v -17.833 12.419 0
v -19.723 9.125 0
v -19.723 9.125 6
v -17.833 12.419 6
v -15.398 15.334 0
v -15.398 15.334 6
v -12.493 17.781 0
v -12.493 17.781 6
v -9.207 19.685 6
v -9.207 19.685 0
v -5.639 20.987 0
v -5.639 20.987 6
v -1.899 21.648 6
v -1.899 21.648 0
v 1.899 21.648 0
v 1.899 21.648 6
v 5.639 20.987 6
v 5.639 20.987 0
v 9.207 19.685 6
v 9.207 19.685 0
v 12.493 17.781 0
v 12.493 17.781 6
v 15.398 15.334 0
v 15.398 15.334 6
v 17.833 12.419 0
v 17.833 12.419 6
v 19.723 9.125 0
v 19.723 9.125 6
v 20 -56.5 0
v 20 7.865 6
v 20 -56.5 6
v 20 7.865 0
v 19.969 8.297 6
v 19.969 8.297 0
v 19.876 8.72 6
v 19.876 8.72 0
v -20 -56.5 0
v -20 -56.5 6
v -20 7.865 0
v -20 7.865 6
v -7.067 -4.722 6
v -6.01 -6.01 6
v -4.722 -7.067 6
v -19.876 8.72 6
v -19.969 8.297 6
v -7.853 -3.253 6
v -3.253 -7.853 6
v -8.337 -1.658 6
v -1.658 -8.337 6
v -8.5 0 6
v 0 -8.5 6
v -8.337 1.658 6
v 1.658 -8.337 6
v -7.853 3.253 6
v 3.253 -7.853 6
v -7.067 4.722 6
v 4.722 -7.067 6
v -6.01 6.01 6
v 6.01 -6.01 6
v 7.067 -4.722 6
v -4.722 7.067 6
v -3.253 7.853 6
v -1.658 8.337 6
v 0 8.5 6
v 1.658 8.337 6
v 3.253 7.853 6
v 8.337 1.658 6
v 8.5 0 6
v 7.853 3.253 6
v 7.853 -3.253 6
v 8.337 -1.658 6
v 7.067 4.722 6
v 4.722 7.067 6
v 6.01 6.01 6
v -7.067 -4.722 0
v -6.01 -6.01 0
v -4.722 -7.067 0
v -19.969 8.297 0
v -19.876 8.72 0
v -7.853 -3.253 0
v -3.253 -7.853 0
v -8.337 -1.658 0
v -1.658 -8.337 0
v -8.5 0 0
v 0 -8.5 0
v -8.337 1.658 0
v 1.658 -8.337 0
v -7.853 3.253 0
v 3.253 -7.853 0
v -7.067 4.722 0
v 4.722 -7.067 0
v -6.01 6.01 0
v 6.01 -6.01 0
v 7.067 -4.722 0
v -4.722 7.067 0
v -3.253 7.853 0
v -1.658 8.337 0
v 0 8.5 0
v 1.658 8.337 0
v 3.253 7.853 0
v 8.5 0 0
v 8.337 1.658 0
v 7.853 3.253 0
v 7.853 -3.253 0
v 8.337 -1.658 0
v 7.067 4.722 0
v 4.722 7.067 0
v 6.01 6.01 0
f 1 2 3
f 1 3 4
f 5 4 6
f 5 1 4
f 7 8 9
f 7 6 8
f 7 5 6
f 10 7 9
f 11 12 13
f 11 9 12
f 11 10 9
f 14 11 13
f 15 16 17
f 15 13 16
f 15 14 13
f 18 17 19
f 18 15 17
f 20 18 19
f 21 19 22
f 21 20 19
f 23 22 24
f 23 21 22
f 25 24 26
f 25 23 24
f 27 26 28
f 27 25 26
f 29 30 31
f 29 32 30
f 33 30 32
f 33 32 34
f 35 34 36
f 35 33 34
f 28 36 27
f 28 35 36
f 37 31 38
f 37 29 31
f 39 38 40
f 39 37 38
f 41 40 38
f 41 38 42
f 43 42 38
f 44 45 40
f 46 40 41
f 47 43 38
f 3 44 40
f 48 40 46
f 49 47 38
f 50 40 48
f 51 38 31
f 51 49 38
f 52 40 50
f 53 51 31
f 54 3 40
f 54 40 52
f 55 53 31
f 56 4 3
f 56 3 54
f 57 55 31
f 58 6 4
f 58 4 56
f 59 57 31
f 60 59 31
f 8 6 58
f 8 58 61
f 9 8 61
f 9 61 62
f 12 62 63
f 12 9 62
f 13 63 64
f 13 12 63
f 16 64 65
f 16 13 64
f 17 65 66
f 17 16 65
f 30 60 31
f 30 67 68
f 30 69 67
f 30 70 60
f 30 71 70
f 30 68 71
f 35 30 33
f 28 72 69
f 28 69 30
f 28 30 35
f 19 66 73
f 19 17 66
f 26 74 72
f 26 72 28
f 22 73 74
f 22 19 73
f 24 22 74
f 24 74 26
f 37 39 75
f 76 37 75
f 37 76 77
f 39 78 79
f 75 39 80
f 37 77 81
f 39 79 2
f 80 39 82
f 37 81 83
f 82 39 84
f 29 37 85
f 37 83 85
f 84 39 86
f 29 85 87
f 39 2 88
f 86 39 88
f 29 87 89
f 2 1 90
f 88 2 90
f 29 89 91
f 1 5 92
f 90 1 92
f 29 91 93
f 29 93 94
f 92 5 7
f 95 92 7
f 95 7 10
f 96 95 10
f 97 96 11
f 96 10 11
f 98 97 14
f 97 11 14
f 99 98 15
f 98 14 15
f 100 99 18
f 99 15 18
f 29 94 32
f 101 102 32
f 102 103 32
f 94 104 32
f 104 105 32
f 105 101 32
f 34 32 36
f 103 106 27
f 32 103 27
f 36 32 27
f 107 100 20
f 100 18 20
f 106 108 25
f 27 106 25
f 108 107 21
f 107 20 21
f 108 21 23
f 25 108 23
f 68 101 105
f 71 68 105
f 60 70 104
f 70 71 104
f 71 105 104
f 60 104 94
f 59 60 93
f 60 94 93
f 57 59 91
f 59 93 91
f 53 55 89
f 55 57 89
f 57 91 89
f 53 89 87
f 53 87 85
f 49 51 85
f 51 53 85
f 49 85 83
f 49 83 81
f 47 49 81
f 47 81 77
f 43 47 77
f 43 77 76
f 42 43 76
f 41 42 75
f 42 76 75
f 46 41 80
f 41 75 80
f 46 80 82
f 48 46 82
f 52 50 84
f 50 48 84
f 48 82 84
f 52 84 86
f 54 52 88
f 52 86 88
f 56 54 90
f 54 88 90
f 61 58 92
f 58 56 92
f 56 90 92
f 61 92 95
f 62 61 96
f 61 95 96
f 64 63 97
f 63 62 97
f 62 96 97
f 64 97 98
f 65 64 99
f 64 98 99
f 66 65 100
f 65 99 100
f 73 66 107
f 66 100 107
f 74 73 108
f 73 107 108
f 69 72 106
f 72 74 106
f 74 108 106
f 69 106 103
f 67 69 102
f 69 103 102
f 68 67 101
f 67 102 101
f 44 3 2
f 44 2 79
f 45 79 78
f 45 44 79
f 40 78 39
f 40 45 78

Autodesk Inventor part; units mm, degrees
ref_plane "YZ Plane" through (0, 0, 0) normal (1, 0, 0) x (0, 1, 0)
ref_plane "XZ Plane" through (0, 0, 0) normal (0, 1, 0) x (-1, 0, 0)
ref_plane "XY Plane" through (0, 0, 0) normal (0, 0, 1) x (1, 0, 0)
sketch "Sketch1" plane through (0, 0, 0) normal (0, 0, 1) x (1, 0, 0)
  circle A0 centre (0, 0) radius 8.5
  line L0 (20, 8.5) -> (20, -56.5)
  line L1 (20, -56.5) -> (-20, -56.5)
  line L2 (-20, -56.5) -> (-20, 8.5)
  arc A1 (20, 8.5) -> (-20, 8.5) centre (0, 0) ccw
  point P0 (0, 8.5)
  dimension "d0" = 17
  dimension "d1" = 65
  dimension "d3" = 20
  dimension "d4" = 8.5
extrude "Extrusion1" add sketch "Sketch1" along normal blind 6
fillet "Fillet1" radius 3 2 edges at (20, 8.5, 3) (-20, 8.5, 3)
properties part number "mdf_support"
